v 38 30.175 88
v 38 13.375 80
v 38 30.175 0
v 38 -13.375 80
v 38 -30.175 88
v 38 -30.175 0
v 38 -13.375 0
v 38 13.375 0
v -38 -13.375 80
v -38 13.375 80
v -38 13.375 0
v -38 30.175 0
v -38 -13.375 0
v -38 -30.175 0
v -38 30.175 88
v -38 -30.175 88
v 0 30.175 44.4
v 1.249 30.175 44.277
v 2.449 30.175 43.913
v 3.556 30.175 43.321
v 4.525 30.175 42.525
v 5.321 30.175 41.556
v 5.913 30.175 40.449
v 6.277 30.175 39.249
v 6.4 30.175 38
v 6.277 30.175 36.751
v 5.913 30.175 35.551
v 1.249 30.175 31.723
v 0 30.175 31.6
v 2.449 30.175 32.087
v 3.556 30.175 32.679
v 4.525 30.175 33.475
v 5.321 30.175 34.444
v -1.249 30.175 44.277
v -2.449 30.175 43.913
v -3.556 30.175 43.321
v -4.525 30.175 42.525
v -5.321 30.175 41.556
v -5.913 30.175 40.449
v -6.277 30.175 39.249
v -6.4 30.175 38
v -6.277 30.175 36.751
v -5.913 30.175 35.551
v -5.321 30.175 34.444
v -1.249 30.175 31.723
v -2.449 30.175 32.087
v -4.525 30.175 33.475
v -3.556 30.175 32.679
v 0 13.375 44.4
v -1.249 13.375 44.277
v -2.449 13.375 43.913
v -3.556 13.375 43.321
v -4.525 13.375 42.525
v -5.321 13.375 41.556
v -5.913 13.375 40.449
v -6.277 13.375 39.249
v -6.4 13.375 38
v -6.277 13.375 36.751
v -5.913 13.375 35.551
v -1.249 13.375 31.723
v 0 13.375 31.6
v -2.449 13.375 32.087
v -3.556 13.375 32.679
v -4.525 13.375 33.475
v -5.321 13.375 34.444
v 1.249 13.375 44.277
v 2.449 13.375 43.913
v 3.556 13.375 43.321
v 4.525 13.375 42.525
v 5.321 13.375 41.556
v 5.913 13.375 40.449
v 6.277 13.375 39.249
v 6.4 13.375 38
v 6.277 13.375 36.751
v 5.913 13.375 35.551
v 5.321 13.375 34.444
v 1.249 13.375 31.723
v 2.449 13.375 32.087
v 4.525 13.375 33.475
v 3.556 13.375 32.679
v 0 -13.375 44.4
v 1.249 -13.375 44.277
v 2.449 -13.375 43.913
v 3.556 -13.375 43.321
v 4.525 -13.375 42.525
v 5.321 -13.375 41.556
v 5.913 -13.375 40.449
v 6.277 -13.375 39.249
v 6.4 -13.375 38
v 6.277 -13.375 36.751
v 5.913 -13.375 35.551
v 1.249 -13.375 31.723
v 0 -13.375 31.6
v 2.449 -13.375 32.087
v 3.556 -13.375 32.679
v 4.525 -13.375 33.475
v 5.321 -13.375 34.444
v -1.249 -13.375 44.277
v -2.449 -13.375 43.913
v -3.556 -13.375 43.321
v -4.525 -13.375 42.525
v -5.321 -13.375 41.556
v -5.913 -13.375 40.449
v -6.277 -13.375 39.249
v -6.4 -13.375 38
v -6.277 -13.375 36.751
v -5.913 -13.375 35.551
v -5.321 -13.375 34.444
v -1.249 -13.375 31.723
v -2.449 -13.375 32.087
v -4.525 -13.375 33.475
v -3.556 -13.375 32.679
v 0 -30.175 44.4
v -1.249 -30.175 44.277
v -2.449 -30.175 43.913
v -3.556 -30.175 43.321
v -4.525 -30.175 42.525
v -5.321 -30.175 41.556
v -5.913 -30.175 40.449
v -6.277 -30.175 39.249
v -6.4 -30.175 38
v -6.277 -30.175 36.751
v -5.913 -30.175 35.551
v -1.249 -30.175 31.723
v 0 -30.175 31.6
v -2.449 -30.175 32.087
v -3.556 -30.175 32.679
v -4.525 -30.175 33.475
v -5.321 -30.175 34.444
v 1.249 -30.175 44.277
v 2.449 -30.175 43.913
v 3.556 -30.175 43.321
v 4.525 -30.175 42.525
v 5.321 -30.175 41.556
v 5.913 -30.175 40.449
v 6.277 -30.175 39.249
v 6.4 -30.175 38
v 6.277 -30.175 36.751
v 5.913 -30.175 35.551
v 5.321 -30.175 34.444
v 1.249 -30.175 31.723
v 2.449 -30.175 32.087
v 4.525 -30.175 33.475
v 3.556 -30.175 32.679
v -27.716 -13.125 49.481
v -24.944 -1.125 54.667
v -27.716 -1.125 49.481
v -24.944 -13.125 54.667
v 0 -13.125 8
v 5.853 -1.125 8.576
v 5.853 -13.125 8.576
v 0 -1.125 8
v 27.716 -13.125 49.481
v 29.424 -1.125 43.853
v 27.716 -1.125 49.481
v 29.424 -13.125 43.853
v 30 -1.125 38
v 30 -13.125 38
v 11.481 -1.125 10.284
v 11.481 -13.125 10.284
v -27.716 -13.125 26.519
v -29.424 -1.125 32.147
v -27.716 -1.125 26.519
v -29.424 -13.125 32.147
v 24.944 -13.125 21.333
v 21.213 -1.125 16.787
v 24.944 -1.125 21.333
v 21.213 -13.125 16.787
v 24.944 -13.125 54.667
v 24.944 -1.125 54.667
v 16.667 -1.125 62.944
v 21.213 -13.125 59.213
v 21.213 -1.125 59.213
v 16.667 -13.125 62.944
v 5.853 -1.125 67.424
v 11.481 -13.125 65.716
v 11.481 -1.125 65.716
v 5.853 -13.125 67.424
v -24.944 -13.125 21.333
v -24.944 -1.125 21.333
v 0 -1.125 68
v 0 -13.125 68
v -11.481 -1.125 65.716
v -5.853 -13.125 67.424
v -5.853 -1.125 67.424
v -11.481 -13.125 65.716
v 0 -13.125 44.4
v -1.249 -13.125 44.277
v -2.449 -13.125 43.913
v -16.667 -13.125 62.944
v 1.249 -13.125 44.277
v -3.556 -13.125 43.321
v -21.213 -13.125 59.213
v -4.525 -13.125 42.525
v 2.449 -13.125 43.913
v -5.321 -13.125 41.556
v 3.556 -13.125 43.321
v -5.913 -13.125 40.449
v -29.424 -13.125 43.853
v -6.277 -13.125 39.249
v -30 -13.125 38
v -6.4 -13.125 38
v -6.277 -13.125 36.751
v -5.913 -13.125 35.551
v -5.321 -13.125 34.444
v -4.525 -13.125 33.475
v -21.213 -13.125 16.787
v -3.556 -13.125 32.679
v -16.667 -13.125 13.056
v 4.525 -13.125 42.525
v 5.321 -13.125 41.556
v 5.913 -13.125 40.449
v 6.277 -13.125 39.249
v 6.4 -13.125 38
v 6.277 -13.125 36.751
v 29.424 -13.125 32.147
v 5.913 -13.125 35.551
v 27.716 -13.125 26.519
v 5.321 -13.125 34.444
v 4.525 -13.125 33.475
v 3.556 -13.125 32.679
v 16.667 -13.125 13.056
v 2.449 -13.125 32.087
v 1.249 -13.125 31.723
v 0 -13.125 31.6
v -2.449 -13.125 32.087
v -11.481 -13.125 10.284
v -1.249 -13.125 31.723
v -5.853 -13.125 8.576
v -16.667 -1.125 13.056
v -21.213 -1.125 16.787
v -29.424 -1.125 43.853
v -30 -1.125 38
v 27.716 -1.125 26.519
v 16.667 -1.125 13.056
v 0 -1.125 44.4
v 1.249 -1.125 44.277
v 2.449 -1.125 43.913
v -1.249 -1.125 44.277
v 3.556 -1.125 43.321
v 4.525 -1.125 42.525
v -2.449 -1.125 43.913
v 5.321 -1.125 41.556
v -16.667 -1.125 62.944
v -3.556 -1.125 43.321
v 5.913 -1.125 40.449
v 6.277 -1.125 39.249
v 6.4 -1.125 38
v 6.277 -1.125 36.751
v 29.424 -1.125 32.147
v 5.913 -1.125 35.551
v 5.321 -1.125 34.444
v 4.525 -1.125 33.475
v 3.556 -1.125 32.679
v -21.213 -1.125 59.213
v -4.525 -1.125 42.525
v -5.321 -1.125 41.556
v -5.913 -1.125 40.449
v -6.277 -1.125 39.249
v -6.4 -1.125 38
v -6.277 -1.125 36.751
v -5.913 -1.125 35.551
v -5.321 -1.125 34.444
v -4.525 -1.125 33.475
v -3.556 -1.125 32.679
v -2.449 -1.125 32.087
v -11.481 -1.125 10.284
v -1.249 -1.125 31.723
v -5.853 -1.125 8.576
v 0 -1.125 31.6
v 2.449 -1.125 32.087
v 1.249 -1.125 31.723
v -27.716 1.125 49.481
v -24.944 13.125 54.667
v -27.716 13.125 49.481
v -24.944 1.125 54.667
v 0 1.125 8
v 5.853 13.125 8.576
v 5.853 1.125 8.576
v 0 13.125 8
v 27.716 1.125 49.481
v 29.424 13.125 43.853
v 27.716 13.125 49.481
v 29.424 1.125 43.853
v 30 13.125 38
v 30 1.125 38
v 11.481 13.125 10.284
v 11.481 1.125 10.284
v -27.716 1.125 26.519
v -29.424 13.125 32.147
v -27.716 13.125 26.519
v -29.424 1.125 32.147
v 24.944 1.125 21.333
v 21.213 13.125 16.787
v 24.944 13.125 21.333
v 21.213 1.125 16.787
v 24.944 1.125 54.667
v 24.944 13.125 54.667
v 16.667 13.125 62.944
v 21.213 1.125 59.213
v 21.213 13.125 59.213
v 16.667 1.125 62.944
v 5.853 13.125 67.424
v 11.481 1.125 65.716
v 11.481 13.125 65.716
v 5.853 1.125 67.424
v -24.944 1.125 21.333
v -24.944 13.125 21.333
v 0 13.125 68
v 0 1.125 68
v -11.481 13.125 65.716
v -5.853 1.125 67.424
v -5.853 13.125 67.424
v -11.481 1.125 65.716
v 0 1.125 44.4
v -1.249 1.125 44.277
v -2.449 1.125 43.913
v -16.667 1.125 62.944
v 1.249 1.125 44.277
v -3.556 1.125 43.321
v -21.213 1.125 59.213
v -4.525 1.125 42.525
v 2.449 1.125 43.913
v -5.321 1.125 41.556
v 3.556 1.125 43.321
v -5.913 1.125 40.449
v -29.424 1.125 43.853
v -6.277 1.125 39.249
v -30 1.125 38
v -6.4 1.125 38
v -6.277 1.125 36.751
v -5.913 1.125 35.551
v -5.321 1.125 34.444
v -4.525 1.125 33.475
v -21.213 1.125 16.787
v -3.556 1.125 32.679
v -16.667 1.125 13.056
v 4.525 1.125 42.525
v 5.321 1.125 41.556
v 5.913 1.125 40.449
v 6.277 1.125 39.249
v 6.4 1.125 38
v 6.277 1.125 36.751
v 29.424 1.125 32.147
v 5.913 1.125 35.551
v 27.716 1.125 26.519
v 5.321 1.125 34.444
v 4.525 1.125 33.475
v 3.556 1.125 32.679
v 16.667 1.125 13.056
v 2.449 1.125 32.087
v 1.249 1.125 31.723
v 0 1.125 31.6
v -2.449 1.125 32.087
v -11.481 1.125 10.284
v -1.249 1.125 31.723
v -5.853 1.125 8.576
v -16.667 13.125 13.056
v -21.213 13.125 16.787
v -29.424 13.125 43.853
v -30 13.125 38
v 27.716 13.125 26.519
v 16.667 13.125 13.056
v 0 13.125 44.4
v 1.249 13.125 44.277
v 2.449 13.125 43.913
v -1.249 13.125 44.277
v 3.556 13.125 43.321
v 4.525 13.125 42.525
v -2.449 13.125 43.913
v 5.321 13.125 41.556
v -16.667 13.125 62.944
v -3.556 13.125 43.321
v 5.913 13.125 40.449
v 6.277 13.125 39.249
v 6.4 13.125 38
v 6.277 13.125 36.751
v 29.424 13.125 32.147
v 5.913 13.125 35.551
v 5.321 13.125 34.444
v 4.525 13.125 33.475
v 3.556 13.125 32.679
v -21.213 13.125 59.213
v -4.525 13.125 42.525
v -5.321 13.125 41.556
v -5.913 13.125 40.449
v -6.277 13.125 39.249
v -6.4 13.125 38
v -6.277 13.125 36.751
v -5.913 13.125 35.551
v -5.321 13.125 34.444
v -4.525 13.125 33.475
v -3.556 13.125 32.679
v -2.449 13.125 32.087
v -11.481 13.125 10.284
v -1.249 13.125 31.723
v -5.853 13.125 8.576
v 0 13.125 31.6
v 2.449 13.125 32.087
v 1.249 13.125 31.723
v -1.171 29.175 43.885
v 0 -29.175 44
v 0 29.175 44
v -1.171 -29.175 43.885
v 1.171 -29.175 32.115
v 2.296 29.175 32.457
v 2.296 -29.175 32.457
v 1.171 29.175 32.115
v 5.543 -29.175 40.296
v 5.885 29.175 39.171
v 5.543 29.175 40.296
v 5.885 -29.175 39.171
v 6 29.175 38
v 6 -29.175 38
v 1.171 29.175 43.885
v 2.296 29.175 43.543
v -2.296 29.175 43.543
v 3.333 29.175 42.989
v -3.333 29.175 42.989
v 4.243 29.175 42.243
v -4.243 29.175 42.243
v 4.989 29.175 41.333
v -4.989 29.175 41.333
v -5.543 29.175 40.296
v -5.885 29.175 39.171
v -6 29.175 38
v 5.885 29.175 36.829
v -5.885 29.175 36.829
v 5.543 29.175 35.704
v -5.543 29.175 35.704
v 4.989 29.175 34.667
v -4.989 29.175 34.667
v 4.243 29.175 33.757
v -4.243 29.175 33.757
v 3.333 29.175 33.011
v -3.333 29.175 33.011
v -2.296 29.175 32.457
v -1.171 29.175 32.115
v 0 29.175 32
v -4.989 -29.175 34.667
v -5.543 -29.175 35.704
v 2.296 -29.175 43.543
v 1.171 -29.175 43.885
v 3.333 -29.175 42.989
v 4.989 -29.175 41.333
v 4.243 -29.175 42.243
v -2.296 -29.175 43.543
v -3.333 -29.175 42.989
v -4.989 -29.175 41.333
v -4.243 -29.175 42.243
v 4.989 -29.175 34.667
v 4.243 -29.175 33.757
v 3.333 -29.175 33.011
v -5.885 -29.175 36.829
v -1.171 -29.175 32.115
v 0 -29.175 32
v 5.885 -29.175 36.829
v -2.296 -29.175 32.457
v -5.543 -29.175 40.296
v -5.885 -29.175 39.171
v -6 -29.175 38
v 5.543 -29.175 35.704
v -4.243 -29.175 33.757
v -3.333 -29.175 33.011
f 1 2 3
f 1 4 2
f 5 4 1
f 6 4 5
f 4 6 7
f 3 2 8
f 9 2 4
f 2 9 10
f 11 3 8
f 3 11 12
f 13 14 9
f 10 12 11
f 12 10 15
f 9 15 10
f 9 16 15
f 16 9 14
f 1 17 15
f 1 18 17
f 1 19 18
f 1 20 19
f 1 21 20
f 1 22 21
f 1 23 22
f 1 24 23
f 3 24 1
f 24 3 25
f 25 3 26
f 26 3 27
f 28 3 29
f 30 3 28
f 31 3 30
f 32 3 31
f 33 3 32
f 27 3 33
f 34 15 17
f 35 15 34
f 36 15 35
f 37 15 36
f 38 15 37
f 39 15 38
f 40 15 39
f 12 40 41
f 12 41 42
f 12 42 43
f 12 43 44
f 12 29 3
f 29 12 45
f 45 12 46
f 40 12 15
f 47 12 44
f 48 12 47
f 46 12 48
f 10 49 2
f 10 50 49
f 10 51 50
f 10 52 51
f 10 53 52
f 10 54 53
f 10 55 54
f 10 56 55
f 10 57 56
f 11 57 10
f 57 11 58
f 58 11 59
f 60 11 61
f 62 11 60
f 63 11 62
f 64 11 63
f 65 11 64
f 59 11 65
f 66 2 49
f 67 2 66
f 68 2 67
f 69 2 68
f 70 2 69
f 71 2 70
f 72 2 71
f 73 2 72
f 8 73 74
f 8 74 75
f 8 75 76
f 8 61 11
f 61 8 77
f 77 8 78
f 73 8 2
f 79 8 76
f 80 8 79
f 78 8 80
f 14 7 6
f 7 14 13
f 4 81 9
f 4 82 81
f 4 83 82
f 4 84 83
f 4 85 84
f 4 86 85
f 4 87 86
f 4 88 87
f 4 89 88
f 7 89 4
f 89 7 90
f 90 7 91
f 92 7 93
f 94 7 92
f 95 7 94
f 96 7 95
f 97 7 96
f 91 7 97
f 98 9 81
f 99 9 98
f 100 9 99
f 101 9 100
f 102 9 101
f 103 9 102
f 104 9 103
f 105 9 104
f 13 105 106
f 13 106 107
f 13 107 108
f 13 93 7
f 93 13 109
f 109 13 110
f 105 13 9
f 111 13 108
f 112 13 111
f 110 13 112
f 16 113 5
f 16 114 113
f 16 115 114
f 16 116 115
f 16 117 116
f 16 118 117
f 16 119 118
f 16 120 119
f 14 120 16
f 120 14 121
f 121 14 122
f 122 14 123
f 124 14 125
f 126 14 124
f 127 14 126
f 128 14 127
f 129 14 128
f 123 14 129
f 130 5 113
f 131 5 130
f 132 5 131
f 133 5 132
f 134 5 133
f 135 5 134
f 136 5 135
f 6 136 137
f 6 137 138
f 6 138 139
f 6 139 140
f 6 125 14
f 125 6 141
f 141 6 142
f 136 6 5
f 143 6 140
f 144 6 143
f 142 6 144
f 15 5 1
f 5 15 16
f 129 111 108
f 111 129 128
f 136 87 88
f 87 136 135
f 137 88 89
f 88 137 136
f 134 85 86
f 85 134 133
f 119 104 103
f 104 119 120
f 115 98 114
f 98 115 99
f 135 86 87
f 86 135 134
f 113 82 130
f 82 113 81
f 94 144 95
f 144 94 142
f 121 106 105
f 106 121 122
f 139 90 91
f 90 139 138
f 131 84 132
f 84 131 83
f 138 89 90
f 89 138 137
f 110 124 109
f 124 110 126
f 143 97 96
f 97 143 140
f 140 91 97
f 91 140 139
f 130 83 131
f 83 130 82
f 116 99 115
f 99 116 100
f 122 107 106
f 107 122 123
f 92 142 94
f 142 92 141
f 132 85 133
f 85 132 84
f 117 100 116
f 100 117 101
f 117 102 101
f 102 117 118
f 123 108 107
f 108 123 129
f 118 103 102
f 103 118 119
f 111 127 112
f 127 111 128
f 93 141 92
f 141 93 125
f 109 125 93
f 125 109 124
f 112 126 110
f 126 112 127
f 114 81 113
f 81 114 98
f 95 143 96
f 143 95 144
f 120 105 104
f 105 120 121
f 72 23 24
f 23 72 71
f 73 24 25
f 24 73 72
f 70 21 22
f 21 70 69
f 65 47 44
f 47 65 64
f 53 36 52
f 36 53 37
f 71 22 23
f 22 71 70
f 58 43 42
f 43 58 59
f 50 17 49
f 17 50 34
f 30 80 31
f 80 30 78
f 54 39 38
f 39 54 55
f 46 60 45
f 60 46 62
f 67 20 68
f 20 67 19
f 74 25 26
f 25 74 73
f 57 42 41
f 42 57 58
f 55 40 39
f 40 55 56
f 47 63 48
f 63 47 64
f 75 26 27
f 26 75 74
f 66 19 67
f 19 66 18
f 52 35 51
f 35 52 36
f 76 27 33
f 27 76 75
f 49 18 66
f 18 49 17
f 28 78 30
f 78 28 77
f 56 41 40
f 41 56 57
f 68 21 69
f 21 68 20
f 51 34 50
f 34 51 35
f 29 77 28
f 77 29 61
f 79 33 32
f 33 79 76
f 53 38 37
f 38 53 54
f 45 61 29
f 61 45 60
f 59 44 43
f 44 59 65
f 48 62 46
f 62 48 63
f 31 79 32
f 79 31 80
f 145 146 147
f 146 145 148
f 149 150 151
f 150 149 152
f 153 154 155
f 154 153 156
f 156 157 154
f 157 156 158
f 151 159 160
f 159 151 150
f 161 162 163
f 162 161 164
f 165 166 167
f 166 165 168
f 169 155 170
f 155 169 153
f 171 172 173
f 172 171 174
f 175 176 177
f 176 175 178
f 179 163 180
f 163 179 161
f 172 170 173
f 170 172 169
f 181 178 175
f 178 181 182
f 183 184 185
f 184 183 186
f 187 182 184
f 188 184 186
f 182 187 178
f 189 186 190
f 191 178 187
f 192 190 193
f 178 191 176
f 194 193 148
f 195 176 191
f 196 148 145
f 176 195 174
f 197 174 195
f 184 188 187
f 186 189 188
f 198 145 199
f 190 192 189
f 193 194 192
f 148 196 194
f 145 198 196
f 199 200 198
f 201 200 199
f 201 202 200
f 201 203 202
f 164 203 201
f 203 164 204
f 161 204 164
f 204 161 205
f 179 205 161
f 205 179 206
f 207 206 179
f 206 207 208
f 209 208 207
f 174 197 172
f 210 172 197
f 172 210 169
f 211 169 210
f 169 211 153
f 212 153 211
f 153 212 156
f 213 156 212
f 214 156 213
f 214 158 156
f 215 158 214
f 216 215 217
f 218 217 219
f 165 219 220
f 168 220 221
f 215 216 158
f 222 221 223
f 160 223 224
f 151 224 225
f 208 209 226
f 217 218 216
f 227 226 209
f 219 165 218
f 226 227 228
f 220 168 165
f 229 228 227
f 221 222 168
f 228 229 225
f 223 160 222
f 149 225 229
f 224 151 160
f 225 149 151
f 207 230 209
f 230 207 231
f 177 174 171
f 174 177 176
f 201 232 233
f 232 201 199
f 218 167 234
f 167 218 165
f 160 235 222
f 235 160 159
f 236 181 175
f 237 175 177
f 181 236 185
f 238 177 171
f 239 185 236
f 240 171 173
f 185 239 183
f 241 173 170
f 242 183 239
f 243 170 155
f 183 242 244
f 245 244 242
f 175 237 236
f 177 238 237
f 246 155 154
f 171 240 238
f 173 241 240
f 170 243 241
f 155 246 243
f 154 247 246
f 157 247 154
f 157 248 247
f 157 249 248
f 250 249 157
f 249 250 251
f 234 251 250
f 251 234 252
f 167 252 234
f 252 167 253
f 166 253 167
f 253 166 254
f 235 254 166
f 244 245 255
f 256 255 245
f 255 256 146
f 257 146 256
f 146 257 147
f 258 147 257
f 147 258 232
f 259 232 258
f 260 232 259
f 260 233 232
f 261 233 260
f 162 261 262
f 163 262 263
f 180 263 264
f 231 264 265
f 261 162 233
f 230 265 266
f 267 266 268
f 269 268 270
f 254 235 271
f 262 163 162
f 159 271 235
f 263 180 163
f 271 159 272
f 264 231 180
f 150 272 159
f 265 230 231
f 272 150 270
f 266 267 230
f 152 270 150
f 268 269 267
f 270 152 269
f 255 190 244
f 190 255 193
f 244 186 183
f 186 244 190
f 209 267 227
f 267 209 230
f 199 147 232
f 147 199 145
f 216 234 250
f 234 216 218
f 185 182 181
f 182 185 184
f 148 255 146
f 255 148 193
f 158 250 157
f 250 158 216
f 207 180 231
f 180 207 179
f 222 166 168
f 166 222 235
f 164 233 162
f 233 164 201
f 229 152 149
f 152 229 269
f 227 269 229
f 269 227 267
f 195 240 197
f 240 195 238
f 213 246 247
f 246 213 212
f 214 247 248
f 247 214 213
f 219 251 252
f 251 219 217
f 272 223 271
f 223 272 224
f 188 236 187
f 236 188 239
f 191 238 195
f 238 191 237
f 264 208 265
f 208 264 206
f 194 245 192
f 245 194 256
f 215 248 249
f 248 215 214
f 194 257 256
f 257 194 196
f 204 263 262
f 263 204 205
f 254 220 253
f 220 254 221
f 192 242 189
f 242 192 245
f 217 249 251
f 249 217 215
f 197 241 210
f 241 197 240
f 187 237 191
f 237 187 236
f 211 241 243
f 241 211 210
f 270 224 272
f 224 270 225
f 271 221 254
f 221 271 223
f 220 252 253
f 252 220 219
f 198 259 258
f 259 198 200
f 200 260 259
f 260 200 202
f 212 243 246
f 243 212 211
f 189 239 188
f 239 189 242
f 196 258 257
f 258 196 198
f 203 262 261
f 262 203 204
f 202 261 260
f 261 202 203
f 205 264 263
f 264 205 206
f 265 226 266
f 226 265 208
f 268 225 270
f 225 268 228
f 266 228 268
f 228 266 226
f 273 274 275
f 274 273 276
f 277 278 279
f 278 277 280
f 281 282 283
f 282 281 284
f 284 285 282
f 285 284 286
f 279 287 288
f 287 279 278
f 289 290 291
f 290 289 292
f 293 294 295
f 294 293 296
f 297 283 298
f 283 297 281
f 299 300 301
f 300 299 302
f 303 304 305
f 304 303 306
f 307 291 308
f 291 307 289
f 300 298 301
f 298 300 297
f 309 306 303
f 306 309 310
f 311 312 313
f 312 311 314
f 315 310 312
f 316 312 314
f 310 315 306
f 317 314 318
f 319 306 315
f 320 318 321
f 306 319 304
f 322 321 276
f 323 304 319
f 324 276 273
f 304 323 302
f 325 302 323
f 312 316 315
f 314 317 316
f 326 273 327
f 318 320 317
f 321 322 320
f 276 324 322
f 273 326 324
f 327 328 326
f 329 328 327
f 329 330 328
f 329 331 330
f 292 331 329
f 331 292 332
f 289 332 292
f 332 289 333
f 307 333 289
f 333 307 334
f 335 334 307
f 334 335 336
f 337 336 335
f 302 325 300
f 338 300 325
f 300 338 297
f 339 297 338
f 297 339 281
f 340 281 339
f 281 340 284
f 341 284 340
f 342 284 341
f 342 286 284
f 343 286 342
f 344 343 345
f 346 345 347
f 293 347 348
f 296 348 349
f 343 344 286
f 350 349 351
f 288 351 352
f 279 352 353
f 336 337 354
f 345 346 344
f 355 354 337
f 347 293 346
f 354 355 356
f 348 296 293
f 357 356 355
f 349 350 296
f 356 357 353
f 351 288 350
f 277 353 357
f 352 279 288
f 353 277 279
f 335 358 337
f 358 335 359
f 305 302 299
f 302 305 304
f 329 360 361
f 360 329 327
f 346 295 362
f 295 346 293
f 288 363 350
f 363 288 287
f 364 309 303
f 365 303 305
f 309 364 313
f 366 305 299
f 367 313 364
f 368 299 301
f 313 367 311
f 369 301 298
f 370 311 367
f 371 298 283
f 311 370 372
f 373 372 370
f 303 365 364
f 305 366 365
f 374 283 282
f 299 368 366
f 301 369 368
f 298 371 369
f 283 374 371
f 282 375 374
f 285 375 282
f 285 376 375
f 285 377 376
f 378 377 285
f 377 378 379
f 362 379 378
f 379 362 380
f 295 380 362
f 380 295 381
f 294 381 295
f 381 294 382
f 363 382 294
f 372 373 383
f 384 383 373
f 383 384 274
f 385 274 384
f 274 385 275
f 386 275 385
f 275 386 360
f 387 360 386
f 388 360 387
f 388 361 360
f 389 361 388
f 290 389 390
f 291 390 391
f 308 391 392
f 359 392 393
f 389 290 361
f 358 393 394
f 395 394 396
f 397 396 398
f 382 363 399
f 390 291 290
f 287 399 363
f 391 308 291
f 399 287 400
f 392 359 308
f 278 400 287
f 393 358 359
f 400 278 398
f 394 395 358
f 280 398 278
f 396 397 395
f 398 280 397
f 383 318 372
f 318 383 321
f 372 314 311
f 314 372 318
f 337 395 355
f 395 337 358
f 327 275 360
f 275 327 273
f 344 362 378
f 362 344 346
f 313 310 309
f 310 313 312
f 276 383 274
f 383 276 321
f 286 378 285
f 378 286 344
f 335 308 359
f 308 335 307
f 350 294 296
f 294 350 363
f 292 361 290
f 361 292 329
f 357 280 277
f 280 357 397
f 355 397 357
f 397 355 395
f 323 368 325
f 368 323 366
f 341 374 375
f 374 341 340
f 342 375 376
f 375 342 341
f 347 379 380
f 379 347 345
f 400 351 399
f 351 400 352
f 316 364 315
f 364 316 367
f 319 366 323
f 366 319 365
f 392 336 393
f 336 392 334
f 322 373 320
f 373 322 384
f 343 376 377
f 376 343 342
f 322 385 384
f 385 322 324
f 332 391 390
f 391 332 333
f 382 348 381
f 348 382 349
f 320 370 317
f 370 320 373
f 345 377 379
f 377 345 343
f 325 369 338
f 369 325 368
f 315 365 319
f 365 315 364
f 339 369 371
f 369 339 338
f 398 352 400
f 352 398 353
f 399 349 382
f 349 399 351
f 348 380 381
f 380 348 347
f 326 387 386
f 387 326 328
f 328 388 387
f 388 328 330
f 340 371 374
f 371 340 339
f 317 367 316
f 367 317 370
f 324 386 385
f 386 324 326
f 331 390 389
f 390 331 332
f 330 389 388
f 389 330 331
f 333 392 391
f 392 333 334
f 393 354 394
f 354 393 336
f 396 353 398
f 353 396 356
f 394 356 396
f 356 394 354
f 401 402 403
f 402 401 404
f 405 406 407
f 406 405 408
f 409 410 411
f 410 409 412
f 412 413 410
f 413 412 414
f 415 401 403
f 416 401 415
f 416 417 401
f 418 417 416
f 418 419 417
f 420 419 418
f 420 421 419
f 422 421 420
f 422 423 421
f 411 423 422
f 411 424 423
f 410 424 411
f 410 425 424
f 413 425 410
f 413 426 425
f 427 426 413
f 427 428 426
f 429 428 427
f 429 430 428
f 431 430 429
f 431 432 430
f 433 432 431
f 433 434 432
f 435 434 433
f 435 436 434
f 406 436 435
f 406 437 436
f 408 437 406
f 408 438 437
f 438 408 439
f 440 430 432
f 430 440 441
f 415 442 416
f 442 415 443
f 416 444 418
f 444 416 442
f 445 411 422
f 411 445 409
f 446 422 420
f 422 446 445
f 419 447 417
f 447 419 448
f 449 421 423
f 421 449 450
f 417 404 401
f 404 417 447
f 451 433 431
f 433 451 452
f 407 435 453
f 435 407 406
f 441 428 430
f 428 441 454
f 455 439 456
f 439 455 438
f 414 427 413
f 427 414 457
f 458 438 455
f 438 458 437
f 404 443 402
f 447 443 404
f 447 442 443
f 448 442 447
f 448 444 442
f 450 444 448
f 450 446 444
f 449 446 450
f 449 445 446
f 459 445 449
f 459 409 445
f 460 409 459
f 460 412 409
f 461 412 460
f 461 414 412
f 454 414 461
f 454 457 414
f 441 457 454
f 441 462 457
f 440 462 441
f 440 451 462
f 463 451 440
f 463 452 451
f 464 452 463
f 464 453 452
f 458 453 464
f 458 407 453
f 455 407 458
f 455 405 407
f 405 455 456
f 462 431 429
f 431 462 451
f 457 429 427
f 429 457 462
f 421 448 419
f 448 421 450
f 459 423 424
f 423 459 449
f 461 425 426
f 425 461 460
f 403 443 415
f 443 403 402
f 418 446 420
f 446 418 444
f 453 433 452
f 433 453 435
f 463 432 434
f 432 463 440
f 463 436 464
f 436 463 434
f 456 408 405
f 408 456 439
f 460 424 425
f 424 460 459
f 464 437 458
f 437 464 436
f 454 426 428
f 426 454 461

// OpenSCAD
$fn = 32;

// ------------------------------------------------------------------------
// Trolley wheel set: wheels d60, fork 80 mm tall
// Every part is its own module, assembly() places every instance.
// ------------------------------------------------------------------------

// --- part 1 ---
module trolley_fork() {
  difference() {
    union() {
      translate([-38, 13.375, 0]) cube([76, 16.8, 80]);
      translate([-38, -30.175, 0]) cube([76, 16.8, 80]);
      translate([-38, -30.175, 80]) cube([76, 60.35, 8]);
    }
    translate([0, -21.775, 38]) rotate([90, 0, 0]) cylinder(h = 18.8, d = 12.8, center = true);
    translate([0, 21.775, 38]) rotate([90, 0, 0]) cylinder(h = 18.8, d = 12.8, center = true);
  }
}

// --- part 2 ---
module trolley_wheel() {
  difference() {
      translate([0, 0, 0]) cylinder(h = 12, d = 60);
      translate([0, 0, -1]) cylinder(h = 14, d = 12.8);
    }
}

// --- part 3 ---
module trolley_axle() {
  translate([0, 0, -29.175]) cylinder(h = 58.35, d = 12);
}

// --- assembly ---
module assembly() {
  color([0.80, 0.24, 0.20]) translate([0, 0, 0]) rotate([0, 0, 0]) trolley_fork();
  color([0.20, 0.45, 0.75]) translate([0, -1.125, 38]) rotate([90, 0, 0]) trolley_wheel();
  color([0.25, 0.62, 0.32]) translate([0, 13.125, 38]) rotate([90, 0, 0]) trolley_wheel();
  color([0.92, 0.70, 0.18]) translate([0, 0, 38]) rotate([90, 0, 0]) trolley_axle();
}

assembly();
